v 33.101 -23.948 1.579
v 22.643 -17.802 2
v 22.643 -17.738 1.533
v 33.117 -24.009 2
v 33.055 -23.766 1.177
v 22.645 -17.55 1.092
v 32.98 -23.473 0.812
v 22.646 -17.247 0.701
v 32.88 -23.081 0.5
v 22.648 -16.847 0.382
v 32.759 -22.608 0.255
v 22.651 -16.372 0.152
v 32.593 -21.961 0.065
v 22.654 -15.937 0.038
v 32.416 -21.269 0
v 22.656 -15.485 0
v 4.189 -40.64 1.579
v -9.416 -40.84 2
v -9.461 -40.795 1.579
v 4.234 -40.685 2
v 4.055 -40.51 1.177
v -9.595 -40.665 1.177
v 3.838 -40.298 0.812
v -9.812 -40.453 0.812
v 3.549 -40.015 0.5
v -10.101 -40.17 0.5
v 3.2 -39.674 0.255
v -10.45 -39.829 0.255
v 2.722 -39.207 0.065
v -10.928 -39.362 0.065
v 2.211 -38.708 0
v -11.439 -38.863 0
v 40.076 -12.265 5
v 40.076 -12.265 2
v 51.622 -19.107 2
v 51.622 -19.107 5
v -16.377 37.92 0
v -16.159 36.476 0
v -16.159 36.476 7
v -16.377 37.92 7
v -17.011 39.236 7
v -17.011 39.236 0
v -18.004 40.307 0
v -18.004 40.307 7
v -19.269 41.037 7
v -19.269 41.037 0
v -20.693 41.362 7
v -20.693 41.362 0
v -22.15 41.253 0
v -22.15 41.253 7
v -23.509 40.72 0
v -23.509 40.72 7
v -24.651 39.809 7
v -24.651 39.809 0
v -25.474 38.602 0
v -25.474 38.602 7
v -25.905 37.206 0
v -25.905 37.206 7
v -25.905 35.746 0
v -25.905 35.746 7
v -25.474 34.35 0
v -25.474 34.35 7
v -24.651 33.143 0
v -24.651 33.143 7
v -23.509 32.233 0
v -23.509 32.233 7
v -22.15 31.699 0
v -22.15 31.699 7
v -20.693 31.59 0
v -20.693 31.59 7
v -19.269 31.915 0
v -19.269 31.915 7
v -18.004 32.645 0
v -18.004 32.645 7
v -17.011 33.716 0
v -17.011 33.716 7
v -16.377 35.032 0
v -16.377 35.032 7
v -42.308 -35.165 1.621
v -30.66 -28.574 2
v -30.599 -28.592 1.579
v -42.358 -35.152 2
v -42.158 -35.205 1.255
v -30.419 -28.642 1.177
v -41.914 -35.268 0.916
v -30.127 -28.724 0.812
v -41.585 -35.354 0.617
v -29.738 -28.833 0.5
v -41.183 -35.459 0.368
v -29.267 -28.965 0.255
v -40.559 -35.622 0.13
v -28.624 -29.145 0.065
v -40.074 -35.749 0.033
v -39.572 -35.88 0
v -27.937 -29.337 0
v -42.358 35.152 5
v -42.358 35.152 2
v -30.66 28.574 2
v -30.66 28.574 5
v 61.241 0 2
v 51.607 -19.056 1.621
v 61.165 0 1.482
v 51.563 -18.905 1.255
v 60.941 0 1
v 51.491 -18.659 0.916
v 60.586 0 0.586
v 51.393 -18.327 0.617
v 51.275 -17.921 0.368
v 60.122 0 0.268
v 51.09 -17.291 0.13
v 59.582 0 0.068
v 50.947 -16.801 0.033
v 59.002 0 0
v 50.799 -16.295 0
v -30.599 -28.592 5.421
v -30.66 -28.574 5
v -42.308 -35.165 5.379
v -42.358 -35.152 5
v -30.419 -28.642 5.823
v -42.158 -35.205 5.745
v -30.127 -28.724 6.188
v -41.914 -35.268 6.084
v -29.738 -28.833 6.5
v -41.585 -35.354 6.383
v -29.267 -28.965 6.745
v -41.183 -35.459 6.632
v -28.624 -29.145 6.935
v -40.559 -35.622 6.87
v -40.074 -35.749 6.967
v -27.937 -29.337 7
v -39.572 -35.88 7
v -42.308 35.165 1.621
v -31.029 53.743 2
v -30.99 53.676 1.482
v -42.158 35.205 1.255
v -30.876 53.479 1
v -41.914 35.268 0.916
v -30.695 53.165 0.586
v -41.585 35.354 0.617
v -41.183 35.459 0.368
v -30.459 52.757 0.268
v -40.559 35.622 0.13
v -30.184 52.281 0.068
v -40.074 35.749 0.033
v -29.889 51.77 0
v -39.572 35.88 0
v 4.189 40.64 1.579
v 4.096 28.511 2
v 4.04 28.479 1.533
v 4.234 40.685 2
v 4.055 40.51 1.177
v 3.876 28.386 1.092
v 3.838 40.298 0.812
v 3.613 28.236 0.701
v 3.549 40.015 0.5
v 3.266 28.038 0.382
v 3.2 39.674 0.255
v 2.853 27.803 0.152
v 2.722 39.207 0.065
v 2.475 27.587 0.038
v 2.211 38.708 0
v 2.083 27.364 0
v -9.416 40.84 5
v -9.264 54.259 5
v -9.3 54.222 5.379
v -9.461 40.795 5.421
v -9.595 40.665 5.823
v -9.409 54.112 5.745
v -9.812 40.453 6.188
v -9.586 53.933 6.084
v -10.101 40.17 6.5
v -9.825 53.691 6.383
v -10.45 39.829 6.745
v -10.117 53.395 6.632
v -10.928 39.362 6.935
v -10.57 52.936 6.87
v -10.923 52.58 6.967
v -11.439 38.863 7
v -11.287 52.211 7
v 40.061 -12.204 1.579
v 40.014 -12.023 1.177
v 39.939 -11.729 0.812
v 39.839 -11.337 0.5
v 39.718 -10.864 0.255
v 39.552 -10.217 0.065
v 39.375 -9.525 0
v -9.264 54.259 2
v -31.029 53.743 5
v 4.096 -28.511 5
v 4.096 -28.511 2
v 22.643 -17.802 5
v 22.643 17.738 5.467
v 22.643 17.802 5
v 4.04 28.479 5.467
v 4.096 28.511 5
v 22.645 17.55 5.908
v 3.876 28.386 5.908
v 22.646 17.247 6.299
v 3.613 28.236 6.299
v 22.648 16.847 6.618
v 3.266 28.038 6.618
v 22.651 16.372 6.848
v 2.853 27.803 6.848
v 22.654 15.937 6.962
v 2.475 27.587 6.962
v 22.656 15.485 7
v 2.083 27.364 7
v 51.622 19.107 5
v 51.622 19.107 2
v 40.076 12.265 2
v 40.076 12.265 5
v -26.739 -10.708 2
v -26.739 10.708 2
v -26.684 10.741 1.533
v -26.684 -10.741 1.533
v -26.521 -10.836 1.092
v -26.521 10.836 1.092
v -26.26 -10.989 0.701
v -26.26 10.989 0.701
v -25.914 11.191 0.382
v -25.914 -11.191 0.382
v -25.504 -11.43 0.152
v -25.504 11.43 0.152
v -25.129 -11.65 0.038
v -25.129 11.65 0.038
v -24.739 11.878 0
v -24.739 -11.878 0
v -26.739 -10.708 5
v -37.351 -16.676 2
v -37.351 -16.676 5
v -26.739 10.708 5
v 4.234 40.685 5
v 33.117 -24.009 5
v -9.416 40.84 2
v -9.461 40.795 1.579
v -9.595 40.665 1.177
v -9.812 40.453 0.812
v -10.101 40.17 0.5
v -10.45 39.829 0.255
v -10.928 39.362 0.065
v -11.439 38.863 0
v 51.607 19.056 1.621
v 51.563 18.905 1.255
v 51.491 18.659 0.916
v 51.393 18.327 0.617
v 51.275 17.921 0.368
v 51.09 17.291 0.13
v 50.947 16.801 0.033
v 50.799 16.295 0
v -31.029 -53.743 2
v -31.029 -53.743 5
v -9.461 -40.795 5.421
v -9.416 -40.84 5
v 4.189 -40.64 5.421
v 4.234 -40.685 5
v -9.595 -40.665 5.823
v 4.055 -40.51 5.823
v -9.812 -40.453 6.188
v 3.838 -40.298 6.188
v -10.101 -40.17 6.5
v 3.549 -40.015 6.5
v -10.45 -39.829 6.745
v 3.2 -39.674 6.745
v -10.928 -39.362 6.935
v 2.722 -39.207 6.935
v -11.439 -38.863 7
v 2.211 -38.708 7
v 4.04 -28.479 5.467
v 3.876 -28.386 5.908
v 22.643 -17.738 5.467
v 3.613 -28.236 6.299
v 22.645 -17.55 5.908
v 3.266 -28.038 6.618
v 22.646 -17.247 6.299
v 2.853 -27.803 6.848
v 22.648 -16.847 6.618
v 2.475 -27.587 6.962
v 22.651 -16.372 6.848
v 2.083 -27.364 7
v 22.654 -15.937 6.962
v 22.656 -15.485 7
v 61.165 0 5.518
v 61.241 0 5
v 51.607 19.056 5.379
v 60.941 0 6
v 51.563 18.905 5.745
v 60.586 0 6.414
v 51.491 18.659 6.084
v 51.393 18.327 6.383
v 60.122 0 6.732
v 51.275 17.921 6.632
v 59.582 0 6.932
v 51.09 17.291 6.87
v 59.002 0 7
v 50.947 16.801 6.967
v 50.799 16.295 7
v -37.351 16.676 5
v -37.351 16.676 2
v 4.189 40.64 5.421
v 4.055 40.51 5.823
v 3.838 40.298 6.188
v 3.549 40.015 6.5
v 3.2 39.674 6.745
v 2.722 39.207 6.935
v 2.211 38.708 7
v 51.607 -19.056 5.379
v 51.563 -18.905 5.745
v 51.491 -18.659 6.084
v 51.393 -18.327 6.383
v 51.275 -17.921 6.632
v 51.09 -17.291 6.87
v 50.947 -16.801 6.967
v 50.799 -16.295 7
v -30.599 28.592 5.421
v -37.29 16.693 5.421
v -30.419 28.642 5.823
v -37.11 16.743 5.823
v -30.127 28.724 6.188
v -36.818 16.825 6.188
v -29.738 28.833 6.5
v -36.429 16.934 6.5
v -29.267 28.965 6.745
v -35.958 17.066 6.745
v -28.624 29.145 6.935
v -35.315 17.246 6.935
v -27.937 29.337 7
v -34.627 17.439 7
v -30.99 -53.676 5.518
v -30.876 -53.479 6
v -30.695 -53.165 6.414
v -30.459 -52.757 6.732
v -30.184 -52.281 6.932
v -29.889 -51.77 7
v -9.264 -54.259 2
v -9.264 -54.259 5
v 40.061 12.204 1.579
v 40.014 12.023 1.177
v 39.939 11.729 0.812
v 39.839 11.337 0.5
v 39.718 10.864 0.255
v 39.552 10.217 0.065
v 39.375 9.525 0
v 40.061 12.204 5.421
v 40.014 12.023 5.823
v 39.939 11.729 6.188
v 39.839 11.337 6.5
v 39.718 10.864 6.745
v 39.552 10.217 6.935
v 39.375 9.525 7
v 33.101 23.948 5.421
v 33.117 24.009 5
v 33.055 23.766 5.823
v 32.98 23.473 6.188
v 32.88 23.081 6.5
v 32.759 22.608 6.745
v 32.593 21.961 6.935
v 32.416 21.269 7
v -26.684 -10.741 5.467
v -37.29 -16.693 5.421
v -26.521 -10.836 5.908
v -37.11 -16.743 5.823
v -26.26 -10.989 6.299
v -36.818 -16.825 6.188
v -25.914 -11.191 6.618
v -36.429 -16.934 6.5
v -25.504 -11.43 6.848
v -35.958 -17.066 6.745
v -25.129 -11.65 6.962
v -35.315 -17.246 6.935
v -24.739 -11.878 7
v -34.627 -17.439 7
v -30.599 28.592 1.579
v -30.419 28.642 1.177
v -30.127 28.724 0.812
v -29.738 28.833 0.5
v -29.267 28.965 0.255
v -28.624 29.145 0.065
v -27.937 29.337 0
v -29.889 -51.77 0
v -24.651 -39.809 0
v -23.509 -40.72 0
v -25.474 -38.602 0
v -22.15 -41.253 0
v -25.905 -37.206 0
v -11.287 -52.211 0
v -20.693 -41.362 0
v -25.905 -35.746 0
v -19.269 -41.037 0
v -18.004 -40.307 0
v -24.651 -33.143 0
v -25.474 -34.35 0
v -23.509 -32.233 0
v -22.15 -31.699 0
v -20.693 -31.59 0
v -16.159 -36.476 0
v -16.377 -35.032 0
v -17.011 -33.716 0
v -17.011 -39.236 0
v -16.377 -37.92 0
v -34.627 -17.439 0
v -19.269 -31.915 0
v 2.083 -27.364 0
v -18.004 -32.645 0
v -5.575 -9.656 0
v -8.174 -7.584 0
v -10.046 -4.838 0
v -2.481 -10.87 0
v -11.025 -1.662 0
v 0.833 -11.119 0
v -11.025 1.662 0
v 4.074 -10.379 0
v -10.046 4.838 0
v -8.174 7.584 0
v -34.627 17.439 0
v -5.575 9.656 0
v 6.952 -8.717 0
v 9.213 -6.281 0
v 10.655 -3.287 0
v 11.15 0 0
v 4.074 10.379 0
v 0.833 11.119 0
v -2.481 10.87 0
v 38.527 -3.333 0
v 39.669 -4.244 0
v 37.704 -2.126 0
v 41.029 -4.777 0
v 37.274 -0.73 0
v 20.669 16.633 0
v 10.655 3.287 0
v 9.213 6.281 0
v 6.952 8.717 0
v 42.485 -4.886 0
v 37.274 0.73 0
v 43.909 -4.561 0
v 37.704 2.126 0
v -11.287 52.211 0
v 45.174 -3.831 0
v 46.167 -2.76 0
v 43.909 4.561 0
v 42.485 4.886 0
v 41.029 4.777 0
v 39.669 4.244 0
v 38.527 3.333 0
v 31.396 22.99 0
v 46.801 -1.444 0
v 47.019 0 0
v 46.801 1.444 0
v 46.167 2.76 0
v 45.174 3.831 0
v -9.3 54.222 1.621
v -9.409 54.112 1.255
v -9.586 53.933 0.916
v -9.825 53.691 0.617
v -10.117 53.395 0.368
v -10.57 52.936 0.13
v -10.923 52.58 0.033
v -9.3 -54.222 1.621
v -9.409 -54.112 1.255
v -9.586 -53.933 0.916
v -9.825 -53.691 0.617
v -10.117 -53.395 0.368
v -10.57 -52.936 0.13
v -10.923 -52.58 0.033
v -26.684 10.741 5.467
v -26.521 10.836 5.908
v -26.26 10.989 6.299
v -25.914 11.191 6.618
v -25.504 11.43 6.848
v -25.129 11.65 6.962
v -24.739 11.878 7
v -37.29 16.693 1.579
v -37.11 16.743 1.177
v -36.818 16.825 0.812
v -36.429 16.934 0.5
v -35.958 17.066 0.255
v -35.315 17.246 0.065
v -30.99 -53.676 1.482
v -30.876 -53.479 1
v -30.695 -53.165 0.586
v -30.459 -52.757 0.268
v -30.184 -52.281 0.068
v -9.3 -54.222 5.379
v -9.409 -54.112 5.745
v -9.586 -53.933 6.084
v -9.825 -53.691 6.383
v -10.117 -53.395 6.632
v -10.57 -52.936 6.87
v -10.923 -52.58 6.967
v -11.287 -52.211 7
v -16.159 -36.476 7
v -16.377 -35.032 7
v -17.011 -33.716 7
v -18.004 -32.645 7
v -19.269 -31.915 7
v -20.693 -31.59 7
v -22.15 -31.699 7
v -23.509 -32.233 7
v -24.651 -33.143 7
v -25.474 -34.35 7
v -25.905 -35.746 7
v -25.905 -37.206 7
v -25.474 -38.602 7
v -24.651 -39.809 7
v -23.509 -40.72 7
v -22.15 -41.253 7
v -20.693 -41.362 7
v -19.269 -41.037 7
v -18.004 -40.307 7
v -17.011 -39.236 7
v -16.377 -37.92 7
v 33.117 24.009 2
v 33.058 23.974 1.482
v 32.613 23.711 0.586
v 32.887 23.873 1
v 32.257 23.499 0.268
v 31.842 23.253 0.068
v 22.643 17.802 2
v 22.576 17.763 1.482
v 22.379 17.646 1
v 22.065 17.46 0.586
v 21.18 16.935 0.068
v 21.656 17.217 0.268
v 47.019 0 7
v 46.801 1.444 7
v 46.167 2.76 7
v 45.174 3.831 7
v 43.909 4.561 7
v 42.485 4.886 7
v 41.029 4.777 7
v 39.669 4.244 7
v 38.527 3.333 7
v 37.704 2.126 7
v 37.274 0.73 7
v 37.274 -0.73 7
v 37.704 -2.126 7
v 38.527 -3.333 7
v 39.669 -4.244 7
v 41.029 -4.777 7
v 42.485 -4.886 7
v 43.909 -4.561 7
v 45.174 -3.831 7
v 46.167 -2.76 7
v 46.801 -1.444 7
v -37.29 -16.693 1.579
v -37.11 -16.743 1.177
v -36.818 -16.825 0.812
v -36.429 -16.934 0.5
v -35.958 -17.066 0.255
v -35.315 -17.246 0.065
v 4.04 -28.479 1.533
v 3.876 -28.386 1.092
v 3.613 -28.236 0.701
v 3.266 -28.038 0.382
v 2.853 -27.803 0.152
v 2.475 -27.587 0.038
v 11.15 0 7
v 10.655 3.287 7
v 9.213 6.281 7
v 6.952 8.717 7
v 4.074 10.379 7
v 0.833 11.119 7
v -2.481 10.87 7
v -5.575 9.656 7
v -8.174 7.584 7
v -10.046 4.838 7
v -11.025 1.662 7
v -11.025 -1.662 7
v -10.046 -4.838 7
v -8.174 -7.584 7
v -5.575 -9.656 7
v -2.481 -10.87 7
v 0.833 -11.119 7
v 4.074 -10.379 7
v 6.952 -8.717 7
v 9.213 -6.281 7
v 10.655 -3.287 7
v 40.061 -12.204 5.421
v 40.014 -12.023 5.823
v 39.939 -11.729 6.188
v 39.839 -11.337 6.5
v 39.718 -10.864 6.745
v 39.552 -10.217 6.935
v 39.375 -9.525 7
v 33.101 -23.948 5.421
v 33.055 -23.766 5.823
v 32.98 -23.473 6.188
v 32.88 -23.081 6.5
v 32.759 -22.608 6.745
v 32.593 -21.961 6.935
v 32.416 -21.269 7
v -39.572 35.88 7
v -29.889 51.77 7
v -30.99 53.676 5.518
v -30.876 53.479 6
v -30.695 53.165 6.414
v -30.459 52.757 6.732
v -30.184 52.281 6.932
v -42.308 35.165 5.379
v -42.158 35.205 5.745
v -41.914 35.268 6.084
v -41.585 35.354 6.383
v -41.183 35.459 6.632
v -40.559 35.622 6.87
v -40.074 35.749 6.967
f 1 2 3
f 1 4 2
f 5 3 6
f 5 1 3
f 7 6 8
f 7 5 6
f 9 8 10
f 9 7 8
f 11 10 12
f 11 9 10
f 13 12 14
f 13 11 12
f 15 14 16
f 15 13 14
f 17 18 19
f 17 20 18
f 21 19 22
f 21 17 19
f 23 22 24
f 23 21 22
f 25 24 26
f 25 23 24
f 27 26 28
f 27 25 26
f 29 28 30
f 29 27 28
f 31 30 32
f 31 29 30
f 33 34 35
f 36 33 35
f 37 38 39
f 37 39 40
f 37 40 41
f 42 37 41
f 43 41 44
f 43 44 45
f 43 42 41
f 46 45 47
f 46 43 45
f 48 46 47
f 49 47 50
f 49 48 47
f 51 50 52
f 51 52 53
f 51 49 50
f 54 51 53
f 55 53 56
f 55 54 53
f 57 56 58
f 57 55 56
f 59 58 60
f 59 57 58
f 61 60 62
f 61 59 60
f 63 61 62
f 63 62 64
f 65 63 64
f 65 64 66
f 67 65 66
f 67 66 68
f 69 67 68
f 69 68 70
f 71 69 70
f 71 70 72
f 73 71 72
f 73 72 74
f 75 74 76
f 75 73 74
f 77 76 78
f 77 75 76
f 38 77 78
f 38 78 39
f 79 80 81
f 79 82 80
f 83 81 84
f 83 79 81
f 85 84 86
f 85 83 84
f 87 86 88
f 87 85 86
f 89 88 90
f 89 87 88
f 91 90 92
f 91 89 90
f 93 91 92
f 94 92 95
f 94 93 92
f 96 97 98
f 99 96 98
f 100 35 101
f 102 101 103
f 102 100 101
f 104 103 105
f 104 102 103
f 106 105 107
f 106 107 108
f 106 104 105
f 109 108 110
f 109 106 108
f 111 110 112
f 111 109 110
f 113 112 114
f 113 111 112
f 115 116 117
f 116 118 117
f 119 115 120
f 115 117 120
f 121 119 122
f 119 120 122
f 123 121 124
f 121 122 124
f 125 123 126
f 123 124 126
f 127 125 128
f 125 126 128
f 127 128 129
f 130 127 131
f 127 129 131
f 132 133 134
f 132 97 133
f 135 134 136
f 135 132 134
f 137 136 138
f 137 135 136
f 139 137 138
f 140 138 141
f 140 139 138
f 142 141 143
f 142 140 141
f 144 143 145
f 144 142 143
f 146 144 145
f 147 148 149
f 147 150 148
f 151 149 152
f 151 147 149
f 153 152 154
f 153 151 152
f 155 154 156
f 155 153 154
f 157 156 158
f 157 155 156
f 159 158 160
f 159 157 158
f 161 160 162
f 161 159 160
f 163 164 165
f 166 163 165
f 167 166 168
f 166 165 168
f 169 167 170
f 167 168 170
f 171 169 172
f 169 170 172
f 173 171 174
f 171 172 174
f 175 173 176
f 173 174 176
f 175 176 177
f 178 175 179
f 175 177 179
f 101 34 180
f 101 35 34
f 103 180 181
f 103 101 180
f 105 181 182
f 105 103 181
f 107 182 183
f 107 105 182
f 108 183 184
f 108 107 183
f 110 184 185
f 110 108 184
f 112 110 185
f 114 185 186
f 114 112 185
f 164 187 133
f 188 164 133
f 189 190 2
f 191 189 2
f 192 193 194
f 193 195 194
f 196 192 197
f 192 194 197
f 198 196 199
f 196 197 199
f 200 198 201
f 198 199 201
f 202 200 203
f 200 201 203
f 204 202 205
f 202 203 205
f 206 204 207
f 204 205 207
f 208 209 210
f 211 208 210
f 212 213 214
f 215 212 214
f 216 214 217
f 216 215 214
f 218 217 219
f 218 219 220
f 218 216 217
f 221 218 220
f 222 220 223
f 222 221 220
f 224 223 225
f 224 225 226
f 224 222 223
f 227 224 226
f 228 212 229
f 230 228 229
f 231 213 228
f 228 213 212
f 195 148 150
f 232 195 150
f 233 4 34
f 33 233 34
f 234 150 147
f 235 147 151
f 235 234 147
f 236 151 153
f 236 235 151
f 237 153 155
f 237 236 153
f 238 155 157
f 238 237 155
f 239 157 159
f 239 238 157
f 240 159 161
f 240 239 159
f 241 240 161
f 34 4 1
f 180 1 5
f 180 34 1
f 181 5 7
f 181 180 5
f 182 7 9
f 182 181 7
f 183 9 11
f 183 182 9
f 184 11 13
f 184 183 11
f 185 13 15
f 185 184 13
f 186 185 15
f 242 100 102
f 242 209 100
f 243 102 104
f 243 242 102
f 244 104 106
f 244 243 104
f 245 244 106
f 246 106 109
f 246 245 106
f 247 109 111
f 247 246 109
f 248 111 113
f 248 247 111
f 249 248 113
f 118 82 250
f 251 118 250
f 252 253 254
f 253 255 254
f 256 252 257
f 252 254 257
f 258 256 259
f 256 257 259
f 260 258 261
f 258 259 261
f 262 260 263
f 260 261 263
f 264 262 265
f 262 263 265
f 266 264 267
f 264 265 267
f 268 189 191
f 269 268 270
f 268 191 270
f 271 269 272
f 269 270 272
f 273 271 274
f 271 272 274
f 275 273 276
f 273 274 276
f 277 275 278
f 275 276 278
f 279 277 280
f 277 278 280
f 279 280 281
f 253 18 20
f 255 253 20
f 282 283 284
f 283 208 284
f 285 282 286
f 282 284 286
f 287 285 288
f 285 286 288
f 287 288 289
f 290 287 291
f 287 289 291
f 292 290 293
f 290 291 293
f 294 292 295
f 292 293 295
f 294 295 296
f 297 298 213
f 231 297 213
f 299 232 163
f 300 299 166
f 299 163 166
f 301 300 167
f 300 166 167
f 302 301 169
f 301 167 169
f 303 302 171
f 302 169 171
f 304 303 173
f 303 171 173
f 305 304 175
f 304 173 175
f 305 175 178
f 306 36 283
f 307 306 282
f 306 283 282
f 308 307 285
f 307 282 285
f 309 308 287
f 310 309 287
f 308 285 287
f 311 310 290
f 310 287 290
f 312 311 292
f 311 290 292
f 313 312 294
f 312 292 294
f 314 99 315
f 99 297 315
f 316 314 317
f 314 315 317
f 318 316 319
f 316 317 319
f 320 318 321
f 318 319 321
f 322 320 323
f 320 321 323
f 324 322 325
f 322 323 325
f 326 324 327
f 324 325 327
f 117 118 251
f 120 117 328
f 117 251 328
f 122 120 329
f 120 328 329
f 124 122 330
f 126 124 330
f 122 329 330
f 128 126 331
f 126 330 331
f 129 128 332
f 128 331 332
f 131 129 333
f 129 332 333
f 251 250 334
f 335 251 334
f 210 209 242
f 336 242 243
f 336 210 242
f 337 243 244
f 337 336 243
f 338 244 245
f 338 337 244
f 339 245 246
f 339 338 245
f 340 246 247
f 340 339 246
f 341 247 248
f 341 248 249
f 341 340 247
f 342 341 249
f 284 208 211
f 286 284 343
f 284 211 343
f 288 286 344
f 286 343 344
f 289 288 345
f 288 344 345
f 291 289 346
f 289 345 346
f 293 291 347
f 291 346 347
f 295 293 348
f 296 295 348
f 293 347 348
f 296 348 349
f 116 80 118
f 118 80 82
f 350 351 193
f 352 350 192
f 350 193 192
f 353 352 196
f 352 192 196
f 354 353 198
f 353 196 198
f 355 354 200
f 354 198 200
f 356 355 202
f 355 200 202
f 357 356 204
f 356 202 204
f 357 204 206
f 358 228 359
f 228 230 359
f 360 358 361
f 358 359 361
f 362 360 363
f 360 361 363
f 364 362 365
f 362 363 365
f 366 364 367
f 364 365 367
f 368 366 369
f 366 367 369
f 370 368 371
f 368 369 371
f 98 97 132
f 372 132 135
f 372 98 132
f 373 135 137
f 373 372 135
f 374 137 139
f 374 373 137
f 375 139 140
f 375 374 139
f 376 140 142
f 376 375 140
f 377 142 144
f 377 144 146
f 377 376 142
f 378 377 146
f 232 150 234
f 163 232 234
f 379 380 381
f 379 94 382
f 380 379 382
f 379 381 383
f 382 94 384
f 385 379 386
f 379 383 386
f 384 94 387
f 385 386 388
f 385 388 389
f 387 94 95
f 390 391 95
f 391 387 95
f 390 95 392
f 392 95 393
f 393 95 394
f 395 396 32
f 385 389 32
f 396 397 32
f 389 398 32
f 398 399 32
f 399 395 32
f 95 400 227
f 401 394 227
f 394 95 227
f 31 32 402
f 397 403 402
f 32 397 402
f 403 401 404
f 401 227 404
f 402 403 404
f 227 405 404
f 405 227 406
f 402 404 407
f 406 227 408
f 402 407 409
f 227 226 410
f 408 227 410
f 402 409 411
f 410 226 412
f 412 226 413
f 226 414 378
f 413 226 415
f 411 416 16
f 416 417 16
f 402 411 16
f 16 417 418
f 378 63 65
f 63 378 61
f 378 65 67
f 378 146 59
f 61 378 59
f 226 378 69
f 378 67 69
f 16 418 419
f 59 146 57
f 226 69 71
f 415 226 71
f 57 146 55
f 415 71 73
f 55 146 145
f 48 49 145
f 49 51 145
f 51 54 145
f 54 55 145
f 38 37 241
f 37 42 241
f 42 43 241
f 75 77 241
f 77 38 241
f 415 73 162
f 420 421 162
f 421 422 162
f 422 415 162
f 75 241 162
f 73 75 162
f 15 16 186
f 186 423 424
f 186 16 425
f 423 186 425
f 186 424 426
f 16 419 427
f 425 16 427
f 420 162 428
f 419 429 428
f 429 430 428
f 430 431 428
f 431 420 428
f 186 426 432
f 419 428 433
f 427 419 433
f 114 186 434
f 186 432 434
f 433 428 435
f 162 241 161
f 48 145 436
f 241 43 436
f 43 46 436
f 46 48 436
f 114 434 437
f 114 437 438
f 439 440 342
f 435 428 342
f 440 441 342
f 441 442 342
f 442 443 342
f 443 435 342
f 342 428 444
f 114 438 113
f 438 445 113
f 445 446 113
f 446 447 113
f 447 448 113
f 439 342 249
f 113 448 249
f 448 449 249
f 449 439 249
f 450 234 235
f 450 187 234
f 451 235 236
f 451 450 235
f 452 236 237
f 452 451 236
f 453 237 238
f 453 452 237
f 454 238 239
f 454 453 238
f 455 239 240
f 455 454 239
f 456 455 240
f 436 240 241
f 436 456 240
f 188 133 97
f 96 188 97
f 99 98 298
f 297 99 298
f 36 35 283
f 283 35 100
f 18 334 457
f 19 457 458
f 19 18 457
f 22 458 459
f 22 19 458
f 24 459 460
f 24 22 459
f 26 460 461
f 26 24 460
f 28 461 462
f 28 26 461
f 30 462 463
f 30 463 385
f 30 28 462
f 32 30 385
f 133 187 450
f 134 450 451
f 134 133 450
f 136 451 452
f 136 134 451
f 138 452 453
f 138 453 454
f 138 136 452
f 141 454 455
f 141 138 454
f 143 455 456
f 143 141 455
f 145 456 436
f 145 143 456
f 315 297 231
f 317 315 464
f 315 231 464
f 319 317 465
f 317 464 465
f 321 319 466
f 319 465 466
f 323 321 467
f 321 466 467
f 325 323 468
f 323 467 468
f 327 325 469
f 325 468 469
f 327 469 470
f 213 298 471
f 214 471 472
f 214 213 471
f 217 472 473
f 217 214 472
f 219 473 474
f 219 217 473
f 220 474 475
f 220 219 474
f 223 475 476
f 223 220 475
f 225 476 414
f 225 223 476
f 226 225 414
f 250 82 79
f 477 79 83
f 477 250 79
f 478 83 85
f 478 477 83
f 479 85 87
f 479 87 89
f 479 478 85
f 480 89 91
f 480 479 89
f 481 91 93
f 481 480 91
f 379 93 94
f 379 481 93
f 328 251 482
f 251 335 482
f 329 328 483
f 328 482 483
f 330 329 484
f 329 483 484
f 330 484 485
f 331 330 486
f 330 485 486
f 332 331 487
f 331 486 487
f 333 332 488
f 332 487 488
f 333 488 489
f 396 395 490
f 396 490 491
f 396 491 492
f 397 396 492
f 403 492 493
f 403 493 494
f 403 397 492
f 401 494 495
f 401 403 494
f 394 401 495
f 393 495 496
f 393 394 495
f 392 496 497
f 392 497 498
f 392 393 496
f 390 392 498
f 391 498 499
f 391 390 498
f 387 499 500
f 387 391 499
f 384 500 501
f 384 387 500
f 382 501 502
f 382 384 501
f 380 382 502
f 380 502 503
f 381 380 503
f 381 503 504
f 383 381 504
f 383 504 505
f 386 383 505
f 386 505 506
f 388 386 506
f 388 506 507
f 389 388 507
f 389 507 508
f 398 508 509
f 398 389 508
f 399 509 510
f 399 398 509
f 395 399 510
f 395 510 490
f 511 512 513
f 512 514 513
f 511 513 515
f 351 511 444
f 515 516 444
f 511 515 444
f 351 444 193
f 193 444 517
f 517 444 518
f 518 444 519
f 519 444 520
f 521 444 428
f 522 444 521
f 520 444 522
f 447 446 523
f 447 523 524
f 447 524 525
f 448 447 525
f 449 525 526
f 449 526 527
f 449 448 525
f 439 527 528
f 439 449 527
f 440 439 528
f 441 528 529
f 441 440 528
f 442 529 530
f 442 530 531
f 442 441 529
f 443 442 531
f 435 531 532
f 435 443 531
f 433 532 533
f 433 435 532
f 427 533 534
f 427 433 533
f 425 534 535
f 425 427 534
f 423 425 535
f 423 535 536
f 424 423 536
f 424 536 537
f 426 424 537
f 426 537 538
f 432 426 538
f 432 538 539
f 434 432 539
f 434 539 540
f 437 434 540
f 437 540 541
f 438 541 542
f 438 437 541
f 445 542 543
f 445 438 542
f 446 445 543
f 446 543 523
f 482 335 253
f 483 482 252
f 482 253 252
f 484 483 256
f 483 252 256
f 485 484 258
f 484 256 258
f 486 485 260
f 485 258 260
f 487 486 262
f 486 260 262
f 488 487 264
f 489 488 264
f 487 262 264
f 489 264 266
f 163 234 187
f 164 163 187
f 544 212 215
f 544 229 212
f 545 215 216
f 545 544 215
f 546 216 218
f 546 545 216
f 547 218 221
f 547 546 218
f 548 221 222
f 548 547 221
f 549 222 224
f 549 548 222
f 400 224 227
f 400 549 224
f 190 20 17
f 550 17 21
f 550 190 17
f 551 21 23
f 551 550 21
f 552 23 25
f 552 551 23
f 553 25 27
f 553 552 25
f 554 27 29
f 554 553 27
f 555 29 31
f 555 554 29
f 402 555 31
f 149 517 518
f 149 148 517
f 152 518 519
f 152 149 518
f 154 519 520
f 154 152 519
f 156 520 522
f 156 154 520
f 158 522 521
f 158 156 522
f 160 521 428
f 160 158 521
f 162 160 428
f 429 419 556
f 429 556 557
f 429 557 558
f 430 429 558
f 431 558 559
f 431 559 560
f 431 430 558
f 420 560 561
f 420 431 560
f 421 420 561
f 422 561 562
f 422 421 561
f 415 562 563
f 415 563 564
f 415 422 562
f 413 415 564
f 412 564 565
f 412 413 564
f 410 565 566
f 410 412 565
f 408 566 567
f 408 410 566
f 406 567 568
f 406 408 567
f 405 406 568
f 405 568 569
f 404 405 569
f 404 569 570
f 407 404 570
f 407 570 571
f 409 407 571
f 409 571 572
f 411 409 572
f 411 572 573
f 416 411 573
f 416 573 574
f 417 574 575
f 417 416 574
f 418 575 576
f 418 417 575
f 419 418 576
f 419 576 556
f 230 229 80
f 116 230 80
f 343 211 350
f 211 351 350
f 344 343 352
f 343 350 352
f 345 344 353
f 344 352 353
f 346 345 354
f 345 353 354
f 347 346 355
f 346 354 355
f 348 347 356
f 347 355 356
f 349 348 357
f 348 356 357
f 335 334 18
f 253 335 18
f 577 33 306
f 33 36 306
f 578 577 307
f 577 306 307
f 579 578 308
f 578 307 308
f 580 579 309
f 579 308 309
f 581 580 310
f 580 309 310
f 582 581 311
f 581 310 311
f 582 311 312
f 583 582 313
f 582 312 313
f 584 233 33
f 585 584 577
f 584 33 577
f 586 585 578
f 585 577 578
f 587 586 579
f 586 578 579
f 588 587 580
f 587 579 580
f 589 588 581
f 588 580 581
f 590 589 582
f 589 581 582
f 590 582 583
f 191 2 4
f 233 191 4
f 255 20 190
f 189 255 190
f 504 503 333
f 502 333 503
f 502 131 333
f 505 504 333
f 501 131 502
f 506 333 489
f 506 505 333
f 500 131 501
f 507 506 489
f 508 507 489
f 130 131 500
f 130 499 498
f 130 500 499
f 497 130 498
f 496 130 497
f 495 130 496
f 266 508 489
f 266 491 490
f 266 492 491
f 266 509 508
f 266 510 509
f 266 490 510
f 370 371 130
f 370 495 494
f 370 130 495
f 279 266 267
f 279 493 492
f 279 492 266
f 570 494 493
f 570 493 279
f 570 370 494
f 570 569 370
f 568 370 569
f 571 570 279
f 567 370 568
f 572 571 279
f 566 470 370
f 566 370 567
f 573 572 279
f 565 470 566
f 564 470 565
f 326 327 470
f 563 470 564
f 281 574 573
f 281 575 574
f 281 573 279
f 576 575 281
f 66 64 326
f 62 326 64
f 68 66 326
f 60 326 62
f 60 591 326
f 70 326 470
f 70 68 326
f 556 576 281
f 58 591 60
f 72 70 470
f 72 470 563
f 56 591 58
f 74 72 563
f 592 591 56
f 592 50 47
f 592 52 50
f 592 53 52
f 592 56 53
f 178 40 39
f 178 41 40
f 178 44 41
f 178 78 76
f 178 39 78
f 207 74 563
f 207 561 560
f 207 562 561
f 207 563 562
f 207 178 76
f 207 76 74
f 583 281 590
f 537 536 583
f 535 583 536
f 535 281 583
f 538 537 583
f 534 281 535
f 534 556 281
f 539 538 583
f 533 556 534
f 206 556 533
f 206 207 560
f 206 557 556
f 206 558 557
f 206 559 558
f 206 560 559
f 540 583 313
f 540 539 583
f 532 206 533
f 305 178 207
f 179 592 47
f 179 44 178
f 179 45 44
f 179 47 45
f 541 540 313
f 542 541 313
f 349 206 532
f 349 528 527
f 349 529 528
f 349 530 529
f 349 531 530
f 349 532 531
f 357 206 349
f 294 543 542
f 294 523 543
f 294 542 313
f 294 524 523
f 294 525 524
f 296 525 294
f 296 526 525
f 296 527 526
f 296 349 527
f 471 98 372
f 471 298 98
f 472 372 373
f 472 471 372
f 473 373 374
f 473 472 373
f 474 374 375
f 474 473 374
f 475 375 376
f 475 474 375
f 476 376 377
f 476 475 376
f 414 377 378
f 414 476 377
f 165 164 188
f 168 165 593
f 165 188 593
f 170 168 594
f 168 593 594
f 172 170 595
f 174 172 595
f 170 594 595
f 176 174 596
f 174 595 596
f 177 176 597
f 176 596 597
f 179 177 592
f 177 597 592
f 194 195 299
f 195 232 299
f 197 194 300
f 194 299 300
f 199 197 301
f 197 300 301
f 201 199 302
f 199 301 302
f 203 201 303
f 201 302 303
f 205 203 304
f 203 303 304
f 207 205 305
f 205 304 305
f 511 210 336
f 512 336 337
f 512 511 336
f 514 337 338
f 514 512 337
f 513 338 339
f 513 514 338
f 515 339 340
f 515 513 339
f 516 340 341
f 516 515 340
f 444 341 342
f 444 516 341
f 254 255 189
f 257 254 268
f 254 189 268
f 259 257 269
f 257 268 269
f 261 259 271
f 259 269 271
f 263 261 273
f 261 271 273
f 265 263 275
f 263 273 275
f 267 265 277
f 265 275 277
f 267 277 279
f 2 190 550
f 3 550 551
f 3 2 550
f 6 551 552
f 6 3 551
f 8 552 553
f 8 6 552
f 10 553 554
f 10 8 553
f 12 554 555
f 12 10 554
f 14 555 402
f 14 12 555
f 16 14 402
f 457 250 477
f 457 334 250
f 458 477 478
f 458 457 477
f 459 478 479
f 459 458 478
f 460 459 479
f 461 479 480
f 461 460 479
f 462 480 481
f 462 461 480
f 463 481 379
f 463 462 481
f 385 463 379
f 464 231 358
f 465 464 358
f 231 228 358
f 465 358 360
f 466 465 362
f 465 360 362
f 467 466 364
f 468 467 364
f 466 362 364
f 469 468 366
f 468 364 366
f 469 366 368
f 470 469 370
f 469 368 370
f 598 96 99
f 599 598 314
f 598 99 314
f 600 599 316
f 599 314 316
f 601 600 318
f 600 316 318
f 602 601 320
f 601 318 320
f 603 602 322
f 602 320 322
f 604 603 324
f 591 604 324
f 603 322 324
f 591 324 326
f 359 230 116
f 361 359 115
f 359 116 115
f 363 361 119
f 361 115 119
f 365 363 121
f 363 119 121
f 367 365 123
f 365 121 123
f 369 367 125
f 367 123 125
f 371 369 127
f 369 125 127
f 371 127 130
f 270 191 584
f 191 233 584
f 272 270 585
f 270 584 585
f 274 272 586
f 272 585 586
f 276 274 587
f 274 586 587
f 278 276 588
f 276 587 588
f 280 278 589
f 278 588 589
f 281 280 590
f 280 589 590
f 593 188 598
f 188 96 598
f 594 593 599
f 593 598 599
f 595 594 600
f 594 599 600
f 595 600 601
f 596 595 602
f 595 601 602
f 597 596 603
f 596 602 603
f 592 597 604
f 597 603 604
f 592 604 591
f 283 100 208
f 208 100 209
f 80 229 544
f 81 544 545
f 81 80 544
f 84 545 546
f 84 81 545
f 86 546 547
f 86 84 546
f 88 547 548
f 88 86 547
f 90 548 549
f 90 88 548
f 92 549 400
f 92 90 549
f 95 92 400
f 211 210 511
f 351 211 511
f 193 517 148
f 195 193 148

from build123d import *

# Parameters (mm, degrees)
F0_R     = 4.9
F0_R_2   = 17.5
F0_R_3   = 11.15
F1_DEPTH = 7
F2_R     = 2


with BuildPart() as f1:
    # F0 (on Top) → F1 (new body)
    with BuildSketch(Plane.XY):
        Polygon((22.643075, 17.802371), (4.095768, 28.510664), (4.234027, 40.684762), (-9.416056, 40.839784), (-9.263652, 54.259394), (-31.028777, 53.743419), (-42.358188, 35.152255), (-30.660262, 28.574436), (-37.351051, 16.675606), (-26.738843, 10.708293), (-26.738843, -10.708293), (-37.351051, -16.675606), (-30.660262, -28.574436), (-42.358188, -35.152255), (-31.028777, -53.743419), (-9.263652, -54.259394), (-9.416056, -40.839784), (4.234027, -40.684762), (4.095768, -28.510664), (22.643075, -17.802371), (33.117024, -24.009156), (40.076318, -12.265348), (51.62184, -19.107139), (61.241437, 0), (51.62184, 19.107139), (40.076318, 12.265348), (33.117024, 24.009156), align=None)
        with Locations((-21.059453, -36.476043)):
            Circle(F0_R, mode=Mode.SUBTRACT)
        Circle(F0_R_2, mode=Mode.SUBTRACT)
        with Locations((42.118907, 0)):
            Circle(F0_R, mode=Mode.SUBTRACT)
        with Locations((-21.059453, 36.476043)):
            Circle(F0_R, mode=Mode.SUBTRACT)
        Circle(F0_R_2)
        Circle(F0_R_3, mode=Mode.SUBTRACT)
    extrude(amount=F1_DEPTH)

    # F2
    f2_edges = [f1.edges().sort_by_distance(p)[0] for p in [
        (13.369421, -23.156517, 7),
        (27.88005, -20.905763, 7),
        (36.596671, -18.137252, 7),
        (45.849079, -15.686243, 7),
        (56.431638, -9.553569, 7),
        (56.431638, 9.553569, 7),
        (45.849079, 15.686243, 7),
        (36.596671, 18.137252, 7),
        (27.88005, 20.905763, 7),
        (13.369421, 23.156517, 7),
        (4.164897, 34.597713, 7),
        (-2.591015, 40.762273, 7),
        (-9.339854, 47.549589, 7),
        (-36.693482, 44.447837, 7),
        (-20.146215, 54.001407, 7),
        (-36.509225, 31.863346, 7),
        (-34.005657, 22.625021, 7),
        (-32.044947, 13.69195, 7),
        (-26.738843, 0, 7),
        (-32.044947, -13.69195, 7),
        (-34.005657, -22.625021, 7),
        (-36.509225, -31.863346, 7),
        (-36.693482, -44.447837, 7),
        (-20.146215, -54.001407, 7),
        (-2.591015, -40.762273, 7),
        (4.164897, -34.597713, 7),
        (-9.339854, -47.549589, 7),
        (-20.146215, -54.001407, 0),
        (-36.693482, -44.447837, 0),
        (-9.339854, -47.549589, 0),
        (-2.591015, -40.762273, 0),
        (4.164897, -34.597713, 0),
        (13.369421, -23.156517, 0),
        (27.88005, -20.905763, 0),
        (36.596671, -18.137252, 0),
        (45.849079, -15.686243, 0),
        (56.431638, -9.553569, 0),
        (56.431638, 9.553569, 0),
        (45.849079, 15.686243, 0),
        (36.596671, 18.137252, 0),
        (13.369421, 23.156517, 0),
        (4.164897, 34.597713, 0),
        (-9.339854, 47.549589, 0),
        (-2.591015, 40.762273, 0),
        (-20.146215, 54.001407, 0),
        (-36.509225, -31.863346, 0),
        (-34.005657, -22.625021, 0),
        (-32.044947, -13.69195, 0),
        (-26.738843, 0, 0),
        (-32.044947, 13.69195, 0),
        (-34.005657, 22.625021, 0),
        (-36.509225, 31.863346, 0),
        (-36.693482, 44.447837, 0),
    ]]
    fillet(f2_edges, radius=F2_R)


solid = f1.part
